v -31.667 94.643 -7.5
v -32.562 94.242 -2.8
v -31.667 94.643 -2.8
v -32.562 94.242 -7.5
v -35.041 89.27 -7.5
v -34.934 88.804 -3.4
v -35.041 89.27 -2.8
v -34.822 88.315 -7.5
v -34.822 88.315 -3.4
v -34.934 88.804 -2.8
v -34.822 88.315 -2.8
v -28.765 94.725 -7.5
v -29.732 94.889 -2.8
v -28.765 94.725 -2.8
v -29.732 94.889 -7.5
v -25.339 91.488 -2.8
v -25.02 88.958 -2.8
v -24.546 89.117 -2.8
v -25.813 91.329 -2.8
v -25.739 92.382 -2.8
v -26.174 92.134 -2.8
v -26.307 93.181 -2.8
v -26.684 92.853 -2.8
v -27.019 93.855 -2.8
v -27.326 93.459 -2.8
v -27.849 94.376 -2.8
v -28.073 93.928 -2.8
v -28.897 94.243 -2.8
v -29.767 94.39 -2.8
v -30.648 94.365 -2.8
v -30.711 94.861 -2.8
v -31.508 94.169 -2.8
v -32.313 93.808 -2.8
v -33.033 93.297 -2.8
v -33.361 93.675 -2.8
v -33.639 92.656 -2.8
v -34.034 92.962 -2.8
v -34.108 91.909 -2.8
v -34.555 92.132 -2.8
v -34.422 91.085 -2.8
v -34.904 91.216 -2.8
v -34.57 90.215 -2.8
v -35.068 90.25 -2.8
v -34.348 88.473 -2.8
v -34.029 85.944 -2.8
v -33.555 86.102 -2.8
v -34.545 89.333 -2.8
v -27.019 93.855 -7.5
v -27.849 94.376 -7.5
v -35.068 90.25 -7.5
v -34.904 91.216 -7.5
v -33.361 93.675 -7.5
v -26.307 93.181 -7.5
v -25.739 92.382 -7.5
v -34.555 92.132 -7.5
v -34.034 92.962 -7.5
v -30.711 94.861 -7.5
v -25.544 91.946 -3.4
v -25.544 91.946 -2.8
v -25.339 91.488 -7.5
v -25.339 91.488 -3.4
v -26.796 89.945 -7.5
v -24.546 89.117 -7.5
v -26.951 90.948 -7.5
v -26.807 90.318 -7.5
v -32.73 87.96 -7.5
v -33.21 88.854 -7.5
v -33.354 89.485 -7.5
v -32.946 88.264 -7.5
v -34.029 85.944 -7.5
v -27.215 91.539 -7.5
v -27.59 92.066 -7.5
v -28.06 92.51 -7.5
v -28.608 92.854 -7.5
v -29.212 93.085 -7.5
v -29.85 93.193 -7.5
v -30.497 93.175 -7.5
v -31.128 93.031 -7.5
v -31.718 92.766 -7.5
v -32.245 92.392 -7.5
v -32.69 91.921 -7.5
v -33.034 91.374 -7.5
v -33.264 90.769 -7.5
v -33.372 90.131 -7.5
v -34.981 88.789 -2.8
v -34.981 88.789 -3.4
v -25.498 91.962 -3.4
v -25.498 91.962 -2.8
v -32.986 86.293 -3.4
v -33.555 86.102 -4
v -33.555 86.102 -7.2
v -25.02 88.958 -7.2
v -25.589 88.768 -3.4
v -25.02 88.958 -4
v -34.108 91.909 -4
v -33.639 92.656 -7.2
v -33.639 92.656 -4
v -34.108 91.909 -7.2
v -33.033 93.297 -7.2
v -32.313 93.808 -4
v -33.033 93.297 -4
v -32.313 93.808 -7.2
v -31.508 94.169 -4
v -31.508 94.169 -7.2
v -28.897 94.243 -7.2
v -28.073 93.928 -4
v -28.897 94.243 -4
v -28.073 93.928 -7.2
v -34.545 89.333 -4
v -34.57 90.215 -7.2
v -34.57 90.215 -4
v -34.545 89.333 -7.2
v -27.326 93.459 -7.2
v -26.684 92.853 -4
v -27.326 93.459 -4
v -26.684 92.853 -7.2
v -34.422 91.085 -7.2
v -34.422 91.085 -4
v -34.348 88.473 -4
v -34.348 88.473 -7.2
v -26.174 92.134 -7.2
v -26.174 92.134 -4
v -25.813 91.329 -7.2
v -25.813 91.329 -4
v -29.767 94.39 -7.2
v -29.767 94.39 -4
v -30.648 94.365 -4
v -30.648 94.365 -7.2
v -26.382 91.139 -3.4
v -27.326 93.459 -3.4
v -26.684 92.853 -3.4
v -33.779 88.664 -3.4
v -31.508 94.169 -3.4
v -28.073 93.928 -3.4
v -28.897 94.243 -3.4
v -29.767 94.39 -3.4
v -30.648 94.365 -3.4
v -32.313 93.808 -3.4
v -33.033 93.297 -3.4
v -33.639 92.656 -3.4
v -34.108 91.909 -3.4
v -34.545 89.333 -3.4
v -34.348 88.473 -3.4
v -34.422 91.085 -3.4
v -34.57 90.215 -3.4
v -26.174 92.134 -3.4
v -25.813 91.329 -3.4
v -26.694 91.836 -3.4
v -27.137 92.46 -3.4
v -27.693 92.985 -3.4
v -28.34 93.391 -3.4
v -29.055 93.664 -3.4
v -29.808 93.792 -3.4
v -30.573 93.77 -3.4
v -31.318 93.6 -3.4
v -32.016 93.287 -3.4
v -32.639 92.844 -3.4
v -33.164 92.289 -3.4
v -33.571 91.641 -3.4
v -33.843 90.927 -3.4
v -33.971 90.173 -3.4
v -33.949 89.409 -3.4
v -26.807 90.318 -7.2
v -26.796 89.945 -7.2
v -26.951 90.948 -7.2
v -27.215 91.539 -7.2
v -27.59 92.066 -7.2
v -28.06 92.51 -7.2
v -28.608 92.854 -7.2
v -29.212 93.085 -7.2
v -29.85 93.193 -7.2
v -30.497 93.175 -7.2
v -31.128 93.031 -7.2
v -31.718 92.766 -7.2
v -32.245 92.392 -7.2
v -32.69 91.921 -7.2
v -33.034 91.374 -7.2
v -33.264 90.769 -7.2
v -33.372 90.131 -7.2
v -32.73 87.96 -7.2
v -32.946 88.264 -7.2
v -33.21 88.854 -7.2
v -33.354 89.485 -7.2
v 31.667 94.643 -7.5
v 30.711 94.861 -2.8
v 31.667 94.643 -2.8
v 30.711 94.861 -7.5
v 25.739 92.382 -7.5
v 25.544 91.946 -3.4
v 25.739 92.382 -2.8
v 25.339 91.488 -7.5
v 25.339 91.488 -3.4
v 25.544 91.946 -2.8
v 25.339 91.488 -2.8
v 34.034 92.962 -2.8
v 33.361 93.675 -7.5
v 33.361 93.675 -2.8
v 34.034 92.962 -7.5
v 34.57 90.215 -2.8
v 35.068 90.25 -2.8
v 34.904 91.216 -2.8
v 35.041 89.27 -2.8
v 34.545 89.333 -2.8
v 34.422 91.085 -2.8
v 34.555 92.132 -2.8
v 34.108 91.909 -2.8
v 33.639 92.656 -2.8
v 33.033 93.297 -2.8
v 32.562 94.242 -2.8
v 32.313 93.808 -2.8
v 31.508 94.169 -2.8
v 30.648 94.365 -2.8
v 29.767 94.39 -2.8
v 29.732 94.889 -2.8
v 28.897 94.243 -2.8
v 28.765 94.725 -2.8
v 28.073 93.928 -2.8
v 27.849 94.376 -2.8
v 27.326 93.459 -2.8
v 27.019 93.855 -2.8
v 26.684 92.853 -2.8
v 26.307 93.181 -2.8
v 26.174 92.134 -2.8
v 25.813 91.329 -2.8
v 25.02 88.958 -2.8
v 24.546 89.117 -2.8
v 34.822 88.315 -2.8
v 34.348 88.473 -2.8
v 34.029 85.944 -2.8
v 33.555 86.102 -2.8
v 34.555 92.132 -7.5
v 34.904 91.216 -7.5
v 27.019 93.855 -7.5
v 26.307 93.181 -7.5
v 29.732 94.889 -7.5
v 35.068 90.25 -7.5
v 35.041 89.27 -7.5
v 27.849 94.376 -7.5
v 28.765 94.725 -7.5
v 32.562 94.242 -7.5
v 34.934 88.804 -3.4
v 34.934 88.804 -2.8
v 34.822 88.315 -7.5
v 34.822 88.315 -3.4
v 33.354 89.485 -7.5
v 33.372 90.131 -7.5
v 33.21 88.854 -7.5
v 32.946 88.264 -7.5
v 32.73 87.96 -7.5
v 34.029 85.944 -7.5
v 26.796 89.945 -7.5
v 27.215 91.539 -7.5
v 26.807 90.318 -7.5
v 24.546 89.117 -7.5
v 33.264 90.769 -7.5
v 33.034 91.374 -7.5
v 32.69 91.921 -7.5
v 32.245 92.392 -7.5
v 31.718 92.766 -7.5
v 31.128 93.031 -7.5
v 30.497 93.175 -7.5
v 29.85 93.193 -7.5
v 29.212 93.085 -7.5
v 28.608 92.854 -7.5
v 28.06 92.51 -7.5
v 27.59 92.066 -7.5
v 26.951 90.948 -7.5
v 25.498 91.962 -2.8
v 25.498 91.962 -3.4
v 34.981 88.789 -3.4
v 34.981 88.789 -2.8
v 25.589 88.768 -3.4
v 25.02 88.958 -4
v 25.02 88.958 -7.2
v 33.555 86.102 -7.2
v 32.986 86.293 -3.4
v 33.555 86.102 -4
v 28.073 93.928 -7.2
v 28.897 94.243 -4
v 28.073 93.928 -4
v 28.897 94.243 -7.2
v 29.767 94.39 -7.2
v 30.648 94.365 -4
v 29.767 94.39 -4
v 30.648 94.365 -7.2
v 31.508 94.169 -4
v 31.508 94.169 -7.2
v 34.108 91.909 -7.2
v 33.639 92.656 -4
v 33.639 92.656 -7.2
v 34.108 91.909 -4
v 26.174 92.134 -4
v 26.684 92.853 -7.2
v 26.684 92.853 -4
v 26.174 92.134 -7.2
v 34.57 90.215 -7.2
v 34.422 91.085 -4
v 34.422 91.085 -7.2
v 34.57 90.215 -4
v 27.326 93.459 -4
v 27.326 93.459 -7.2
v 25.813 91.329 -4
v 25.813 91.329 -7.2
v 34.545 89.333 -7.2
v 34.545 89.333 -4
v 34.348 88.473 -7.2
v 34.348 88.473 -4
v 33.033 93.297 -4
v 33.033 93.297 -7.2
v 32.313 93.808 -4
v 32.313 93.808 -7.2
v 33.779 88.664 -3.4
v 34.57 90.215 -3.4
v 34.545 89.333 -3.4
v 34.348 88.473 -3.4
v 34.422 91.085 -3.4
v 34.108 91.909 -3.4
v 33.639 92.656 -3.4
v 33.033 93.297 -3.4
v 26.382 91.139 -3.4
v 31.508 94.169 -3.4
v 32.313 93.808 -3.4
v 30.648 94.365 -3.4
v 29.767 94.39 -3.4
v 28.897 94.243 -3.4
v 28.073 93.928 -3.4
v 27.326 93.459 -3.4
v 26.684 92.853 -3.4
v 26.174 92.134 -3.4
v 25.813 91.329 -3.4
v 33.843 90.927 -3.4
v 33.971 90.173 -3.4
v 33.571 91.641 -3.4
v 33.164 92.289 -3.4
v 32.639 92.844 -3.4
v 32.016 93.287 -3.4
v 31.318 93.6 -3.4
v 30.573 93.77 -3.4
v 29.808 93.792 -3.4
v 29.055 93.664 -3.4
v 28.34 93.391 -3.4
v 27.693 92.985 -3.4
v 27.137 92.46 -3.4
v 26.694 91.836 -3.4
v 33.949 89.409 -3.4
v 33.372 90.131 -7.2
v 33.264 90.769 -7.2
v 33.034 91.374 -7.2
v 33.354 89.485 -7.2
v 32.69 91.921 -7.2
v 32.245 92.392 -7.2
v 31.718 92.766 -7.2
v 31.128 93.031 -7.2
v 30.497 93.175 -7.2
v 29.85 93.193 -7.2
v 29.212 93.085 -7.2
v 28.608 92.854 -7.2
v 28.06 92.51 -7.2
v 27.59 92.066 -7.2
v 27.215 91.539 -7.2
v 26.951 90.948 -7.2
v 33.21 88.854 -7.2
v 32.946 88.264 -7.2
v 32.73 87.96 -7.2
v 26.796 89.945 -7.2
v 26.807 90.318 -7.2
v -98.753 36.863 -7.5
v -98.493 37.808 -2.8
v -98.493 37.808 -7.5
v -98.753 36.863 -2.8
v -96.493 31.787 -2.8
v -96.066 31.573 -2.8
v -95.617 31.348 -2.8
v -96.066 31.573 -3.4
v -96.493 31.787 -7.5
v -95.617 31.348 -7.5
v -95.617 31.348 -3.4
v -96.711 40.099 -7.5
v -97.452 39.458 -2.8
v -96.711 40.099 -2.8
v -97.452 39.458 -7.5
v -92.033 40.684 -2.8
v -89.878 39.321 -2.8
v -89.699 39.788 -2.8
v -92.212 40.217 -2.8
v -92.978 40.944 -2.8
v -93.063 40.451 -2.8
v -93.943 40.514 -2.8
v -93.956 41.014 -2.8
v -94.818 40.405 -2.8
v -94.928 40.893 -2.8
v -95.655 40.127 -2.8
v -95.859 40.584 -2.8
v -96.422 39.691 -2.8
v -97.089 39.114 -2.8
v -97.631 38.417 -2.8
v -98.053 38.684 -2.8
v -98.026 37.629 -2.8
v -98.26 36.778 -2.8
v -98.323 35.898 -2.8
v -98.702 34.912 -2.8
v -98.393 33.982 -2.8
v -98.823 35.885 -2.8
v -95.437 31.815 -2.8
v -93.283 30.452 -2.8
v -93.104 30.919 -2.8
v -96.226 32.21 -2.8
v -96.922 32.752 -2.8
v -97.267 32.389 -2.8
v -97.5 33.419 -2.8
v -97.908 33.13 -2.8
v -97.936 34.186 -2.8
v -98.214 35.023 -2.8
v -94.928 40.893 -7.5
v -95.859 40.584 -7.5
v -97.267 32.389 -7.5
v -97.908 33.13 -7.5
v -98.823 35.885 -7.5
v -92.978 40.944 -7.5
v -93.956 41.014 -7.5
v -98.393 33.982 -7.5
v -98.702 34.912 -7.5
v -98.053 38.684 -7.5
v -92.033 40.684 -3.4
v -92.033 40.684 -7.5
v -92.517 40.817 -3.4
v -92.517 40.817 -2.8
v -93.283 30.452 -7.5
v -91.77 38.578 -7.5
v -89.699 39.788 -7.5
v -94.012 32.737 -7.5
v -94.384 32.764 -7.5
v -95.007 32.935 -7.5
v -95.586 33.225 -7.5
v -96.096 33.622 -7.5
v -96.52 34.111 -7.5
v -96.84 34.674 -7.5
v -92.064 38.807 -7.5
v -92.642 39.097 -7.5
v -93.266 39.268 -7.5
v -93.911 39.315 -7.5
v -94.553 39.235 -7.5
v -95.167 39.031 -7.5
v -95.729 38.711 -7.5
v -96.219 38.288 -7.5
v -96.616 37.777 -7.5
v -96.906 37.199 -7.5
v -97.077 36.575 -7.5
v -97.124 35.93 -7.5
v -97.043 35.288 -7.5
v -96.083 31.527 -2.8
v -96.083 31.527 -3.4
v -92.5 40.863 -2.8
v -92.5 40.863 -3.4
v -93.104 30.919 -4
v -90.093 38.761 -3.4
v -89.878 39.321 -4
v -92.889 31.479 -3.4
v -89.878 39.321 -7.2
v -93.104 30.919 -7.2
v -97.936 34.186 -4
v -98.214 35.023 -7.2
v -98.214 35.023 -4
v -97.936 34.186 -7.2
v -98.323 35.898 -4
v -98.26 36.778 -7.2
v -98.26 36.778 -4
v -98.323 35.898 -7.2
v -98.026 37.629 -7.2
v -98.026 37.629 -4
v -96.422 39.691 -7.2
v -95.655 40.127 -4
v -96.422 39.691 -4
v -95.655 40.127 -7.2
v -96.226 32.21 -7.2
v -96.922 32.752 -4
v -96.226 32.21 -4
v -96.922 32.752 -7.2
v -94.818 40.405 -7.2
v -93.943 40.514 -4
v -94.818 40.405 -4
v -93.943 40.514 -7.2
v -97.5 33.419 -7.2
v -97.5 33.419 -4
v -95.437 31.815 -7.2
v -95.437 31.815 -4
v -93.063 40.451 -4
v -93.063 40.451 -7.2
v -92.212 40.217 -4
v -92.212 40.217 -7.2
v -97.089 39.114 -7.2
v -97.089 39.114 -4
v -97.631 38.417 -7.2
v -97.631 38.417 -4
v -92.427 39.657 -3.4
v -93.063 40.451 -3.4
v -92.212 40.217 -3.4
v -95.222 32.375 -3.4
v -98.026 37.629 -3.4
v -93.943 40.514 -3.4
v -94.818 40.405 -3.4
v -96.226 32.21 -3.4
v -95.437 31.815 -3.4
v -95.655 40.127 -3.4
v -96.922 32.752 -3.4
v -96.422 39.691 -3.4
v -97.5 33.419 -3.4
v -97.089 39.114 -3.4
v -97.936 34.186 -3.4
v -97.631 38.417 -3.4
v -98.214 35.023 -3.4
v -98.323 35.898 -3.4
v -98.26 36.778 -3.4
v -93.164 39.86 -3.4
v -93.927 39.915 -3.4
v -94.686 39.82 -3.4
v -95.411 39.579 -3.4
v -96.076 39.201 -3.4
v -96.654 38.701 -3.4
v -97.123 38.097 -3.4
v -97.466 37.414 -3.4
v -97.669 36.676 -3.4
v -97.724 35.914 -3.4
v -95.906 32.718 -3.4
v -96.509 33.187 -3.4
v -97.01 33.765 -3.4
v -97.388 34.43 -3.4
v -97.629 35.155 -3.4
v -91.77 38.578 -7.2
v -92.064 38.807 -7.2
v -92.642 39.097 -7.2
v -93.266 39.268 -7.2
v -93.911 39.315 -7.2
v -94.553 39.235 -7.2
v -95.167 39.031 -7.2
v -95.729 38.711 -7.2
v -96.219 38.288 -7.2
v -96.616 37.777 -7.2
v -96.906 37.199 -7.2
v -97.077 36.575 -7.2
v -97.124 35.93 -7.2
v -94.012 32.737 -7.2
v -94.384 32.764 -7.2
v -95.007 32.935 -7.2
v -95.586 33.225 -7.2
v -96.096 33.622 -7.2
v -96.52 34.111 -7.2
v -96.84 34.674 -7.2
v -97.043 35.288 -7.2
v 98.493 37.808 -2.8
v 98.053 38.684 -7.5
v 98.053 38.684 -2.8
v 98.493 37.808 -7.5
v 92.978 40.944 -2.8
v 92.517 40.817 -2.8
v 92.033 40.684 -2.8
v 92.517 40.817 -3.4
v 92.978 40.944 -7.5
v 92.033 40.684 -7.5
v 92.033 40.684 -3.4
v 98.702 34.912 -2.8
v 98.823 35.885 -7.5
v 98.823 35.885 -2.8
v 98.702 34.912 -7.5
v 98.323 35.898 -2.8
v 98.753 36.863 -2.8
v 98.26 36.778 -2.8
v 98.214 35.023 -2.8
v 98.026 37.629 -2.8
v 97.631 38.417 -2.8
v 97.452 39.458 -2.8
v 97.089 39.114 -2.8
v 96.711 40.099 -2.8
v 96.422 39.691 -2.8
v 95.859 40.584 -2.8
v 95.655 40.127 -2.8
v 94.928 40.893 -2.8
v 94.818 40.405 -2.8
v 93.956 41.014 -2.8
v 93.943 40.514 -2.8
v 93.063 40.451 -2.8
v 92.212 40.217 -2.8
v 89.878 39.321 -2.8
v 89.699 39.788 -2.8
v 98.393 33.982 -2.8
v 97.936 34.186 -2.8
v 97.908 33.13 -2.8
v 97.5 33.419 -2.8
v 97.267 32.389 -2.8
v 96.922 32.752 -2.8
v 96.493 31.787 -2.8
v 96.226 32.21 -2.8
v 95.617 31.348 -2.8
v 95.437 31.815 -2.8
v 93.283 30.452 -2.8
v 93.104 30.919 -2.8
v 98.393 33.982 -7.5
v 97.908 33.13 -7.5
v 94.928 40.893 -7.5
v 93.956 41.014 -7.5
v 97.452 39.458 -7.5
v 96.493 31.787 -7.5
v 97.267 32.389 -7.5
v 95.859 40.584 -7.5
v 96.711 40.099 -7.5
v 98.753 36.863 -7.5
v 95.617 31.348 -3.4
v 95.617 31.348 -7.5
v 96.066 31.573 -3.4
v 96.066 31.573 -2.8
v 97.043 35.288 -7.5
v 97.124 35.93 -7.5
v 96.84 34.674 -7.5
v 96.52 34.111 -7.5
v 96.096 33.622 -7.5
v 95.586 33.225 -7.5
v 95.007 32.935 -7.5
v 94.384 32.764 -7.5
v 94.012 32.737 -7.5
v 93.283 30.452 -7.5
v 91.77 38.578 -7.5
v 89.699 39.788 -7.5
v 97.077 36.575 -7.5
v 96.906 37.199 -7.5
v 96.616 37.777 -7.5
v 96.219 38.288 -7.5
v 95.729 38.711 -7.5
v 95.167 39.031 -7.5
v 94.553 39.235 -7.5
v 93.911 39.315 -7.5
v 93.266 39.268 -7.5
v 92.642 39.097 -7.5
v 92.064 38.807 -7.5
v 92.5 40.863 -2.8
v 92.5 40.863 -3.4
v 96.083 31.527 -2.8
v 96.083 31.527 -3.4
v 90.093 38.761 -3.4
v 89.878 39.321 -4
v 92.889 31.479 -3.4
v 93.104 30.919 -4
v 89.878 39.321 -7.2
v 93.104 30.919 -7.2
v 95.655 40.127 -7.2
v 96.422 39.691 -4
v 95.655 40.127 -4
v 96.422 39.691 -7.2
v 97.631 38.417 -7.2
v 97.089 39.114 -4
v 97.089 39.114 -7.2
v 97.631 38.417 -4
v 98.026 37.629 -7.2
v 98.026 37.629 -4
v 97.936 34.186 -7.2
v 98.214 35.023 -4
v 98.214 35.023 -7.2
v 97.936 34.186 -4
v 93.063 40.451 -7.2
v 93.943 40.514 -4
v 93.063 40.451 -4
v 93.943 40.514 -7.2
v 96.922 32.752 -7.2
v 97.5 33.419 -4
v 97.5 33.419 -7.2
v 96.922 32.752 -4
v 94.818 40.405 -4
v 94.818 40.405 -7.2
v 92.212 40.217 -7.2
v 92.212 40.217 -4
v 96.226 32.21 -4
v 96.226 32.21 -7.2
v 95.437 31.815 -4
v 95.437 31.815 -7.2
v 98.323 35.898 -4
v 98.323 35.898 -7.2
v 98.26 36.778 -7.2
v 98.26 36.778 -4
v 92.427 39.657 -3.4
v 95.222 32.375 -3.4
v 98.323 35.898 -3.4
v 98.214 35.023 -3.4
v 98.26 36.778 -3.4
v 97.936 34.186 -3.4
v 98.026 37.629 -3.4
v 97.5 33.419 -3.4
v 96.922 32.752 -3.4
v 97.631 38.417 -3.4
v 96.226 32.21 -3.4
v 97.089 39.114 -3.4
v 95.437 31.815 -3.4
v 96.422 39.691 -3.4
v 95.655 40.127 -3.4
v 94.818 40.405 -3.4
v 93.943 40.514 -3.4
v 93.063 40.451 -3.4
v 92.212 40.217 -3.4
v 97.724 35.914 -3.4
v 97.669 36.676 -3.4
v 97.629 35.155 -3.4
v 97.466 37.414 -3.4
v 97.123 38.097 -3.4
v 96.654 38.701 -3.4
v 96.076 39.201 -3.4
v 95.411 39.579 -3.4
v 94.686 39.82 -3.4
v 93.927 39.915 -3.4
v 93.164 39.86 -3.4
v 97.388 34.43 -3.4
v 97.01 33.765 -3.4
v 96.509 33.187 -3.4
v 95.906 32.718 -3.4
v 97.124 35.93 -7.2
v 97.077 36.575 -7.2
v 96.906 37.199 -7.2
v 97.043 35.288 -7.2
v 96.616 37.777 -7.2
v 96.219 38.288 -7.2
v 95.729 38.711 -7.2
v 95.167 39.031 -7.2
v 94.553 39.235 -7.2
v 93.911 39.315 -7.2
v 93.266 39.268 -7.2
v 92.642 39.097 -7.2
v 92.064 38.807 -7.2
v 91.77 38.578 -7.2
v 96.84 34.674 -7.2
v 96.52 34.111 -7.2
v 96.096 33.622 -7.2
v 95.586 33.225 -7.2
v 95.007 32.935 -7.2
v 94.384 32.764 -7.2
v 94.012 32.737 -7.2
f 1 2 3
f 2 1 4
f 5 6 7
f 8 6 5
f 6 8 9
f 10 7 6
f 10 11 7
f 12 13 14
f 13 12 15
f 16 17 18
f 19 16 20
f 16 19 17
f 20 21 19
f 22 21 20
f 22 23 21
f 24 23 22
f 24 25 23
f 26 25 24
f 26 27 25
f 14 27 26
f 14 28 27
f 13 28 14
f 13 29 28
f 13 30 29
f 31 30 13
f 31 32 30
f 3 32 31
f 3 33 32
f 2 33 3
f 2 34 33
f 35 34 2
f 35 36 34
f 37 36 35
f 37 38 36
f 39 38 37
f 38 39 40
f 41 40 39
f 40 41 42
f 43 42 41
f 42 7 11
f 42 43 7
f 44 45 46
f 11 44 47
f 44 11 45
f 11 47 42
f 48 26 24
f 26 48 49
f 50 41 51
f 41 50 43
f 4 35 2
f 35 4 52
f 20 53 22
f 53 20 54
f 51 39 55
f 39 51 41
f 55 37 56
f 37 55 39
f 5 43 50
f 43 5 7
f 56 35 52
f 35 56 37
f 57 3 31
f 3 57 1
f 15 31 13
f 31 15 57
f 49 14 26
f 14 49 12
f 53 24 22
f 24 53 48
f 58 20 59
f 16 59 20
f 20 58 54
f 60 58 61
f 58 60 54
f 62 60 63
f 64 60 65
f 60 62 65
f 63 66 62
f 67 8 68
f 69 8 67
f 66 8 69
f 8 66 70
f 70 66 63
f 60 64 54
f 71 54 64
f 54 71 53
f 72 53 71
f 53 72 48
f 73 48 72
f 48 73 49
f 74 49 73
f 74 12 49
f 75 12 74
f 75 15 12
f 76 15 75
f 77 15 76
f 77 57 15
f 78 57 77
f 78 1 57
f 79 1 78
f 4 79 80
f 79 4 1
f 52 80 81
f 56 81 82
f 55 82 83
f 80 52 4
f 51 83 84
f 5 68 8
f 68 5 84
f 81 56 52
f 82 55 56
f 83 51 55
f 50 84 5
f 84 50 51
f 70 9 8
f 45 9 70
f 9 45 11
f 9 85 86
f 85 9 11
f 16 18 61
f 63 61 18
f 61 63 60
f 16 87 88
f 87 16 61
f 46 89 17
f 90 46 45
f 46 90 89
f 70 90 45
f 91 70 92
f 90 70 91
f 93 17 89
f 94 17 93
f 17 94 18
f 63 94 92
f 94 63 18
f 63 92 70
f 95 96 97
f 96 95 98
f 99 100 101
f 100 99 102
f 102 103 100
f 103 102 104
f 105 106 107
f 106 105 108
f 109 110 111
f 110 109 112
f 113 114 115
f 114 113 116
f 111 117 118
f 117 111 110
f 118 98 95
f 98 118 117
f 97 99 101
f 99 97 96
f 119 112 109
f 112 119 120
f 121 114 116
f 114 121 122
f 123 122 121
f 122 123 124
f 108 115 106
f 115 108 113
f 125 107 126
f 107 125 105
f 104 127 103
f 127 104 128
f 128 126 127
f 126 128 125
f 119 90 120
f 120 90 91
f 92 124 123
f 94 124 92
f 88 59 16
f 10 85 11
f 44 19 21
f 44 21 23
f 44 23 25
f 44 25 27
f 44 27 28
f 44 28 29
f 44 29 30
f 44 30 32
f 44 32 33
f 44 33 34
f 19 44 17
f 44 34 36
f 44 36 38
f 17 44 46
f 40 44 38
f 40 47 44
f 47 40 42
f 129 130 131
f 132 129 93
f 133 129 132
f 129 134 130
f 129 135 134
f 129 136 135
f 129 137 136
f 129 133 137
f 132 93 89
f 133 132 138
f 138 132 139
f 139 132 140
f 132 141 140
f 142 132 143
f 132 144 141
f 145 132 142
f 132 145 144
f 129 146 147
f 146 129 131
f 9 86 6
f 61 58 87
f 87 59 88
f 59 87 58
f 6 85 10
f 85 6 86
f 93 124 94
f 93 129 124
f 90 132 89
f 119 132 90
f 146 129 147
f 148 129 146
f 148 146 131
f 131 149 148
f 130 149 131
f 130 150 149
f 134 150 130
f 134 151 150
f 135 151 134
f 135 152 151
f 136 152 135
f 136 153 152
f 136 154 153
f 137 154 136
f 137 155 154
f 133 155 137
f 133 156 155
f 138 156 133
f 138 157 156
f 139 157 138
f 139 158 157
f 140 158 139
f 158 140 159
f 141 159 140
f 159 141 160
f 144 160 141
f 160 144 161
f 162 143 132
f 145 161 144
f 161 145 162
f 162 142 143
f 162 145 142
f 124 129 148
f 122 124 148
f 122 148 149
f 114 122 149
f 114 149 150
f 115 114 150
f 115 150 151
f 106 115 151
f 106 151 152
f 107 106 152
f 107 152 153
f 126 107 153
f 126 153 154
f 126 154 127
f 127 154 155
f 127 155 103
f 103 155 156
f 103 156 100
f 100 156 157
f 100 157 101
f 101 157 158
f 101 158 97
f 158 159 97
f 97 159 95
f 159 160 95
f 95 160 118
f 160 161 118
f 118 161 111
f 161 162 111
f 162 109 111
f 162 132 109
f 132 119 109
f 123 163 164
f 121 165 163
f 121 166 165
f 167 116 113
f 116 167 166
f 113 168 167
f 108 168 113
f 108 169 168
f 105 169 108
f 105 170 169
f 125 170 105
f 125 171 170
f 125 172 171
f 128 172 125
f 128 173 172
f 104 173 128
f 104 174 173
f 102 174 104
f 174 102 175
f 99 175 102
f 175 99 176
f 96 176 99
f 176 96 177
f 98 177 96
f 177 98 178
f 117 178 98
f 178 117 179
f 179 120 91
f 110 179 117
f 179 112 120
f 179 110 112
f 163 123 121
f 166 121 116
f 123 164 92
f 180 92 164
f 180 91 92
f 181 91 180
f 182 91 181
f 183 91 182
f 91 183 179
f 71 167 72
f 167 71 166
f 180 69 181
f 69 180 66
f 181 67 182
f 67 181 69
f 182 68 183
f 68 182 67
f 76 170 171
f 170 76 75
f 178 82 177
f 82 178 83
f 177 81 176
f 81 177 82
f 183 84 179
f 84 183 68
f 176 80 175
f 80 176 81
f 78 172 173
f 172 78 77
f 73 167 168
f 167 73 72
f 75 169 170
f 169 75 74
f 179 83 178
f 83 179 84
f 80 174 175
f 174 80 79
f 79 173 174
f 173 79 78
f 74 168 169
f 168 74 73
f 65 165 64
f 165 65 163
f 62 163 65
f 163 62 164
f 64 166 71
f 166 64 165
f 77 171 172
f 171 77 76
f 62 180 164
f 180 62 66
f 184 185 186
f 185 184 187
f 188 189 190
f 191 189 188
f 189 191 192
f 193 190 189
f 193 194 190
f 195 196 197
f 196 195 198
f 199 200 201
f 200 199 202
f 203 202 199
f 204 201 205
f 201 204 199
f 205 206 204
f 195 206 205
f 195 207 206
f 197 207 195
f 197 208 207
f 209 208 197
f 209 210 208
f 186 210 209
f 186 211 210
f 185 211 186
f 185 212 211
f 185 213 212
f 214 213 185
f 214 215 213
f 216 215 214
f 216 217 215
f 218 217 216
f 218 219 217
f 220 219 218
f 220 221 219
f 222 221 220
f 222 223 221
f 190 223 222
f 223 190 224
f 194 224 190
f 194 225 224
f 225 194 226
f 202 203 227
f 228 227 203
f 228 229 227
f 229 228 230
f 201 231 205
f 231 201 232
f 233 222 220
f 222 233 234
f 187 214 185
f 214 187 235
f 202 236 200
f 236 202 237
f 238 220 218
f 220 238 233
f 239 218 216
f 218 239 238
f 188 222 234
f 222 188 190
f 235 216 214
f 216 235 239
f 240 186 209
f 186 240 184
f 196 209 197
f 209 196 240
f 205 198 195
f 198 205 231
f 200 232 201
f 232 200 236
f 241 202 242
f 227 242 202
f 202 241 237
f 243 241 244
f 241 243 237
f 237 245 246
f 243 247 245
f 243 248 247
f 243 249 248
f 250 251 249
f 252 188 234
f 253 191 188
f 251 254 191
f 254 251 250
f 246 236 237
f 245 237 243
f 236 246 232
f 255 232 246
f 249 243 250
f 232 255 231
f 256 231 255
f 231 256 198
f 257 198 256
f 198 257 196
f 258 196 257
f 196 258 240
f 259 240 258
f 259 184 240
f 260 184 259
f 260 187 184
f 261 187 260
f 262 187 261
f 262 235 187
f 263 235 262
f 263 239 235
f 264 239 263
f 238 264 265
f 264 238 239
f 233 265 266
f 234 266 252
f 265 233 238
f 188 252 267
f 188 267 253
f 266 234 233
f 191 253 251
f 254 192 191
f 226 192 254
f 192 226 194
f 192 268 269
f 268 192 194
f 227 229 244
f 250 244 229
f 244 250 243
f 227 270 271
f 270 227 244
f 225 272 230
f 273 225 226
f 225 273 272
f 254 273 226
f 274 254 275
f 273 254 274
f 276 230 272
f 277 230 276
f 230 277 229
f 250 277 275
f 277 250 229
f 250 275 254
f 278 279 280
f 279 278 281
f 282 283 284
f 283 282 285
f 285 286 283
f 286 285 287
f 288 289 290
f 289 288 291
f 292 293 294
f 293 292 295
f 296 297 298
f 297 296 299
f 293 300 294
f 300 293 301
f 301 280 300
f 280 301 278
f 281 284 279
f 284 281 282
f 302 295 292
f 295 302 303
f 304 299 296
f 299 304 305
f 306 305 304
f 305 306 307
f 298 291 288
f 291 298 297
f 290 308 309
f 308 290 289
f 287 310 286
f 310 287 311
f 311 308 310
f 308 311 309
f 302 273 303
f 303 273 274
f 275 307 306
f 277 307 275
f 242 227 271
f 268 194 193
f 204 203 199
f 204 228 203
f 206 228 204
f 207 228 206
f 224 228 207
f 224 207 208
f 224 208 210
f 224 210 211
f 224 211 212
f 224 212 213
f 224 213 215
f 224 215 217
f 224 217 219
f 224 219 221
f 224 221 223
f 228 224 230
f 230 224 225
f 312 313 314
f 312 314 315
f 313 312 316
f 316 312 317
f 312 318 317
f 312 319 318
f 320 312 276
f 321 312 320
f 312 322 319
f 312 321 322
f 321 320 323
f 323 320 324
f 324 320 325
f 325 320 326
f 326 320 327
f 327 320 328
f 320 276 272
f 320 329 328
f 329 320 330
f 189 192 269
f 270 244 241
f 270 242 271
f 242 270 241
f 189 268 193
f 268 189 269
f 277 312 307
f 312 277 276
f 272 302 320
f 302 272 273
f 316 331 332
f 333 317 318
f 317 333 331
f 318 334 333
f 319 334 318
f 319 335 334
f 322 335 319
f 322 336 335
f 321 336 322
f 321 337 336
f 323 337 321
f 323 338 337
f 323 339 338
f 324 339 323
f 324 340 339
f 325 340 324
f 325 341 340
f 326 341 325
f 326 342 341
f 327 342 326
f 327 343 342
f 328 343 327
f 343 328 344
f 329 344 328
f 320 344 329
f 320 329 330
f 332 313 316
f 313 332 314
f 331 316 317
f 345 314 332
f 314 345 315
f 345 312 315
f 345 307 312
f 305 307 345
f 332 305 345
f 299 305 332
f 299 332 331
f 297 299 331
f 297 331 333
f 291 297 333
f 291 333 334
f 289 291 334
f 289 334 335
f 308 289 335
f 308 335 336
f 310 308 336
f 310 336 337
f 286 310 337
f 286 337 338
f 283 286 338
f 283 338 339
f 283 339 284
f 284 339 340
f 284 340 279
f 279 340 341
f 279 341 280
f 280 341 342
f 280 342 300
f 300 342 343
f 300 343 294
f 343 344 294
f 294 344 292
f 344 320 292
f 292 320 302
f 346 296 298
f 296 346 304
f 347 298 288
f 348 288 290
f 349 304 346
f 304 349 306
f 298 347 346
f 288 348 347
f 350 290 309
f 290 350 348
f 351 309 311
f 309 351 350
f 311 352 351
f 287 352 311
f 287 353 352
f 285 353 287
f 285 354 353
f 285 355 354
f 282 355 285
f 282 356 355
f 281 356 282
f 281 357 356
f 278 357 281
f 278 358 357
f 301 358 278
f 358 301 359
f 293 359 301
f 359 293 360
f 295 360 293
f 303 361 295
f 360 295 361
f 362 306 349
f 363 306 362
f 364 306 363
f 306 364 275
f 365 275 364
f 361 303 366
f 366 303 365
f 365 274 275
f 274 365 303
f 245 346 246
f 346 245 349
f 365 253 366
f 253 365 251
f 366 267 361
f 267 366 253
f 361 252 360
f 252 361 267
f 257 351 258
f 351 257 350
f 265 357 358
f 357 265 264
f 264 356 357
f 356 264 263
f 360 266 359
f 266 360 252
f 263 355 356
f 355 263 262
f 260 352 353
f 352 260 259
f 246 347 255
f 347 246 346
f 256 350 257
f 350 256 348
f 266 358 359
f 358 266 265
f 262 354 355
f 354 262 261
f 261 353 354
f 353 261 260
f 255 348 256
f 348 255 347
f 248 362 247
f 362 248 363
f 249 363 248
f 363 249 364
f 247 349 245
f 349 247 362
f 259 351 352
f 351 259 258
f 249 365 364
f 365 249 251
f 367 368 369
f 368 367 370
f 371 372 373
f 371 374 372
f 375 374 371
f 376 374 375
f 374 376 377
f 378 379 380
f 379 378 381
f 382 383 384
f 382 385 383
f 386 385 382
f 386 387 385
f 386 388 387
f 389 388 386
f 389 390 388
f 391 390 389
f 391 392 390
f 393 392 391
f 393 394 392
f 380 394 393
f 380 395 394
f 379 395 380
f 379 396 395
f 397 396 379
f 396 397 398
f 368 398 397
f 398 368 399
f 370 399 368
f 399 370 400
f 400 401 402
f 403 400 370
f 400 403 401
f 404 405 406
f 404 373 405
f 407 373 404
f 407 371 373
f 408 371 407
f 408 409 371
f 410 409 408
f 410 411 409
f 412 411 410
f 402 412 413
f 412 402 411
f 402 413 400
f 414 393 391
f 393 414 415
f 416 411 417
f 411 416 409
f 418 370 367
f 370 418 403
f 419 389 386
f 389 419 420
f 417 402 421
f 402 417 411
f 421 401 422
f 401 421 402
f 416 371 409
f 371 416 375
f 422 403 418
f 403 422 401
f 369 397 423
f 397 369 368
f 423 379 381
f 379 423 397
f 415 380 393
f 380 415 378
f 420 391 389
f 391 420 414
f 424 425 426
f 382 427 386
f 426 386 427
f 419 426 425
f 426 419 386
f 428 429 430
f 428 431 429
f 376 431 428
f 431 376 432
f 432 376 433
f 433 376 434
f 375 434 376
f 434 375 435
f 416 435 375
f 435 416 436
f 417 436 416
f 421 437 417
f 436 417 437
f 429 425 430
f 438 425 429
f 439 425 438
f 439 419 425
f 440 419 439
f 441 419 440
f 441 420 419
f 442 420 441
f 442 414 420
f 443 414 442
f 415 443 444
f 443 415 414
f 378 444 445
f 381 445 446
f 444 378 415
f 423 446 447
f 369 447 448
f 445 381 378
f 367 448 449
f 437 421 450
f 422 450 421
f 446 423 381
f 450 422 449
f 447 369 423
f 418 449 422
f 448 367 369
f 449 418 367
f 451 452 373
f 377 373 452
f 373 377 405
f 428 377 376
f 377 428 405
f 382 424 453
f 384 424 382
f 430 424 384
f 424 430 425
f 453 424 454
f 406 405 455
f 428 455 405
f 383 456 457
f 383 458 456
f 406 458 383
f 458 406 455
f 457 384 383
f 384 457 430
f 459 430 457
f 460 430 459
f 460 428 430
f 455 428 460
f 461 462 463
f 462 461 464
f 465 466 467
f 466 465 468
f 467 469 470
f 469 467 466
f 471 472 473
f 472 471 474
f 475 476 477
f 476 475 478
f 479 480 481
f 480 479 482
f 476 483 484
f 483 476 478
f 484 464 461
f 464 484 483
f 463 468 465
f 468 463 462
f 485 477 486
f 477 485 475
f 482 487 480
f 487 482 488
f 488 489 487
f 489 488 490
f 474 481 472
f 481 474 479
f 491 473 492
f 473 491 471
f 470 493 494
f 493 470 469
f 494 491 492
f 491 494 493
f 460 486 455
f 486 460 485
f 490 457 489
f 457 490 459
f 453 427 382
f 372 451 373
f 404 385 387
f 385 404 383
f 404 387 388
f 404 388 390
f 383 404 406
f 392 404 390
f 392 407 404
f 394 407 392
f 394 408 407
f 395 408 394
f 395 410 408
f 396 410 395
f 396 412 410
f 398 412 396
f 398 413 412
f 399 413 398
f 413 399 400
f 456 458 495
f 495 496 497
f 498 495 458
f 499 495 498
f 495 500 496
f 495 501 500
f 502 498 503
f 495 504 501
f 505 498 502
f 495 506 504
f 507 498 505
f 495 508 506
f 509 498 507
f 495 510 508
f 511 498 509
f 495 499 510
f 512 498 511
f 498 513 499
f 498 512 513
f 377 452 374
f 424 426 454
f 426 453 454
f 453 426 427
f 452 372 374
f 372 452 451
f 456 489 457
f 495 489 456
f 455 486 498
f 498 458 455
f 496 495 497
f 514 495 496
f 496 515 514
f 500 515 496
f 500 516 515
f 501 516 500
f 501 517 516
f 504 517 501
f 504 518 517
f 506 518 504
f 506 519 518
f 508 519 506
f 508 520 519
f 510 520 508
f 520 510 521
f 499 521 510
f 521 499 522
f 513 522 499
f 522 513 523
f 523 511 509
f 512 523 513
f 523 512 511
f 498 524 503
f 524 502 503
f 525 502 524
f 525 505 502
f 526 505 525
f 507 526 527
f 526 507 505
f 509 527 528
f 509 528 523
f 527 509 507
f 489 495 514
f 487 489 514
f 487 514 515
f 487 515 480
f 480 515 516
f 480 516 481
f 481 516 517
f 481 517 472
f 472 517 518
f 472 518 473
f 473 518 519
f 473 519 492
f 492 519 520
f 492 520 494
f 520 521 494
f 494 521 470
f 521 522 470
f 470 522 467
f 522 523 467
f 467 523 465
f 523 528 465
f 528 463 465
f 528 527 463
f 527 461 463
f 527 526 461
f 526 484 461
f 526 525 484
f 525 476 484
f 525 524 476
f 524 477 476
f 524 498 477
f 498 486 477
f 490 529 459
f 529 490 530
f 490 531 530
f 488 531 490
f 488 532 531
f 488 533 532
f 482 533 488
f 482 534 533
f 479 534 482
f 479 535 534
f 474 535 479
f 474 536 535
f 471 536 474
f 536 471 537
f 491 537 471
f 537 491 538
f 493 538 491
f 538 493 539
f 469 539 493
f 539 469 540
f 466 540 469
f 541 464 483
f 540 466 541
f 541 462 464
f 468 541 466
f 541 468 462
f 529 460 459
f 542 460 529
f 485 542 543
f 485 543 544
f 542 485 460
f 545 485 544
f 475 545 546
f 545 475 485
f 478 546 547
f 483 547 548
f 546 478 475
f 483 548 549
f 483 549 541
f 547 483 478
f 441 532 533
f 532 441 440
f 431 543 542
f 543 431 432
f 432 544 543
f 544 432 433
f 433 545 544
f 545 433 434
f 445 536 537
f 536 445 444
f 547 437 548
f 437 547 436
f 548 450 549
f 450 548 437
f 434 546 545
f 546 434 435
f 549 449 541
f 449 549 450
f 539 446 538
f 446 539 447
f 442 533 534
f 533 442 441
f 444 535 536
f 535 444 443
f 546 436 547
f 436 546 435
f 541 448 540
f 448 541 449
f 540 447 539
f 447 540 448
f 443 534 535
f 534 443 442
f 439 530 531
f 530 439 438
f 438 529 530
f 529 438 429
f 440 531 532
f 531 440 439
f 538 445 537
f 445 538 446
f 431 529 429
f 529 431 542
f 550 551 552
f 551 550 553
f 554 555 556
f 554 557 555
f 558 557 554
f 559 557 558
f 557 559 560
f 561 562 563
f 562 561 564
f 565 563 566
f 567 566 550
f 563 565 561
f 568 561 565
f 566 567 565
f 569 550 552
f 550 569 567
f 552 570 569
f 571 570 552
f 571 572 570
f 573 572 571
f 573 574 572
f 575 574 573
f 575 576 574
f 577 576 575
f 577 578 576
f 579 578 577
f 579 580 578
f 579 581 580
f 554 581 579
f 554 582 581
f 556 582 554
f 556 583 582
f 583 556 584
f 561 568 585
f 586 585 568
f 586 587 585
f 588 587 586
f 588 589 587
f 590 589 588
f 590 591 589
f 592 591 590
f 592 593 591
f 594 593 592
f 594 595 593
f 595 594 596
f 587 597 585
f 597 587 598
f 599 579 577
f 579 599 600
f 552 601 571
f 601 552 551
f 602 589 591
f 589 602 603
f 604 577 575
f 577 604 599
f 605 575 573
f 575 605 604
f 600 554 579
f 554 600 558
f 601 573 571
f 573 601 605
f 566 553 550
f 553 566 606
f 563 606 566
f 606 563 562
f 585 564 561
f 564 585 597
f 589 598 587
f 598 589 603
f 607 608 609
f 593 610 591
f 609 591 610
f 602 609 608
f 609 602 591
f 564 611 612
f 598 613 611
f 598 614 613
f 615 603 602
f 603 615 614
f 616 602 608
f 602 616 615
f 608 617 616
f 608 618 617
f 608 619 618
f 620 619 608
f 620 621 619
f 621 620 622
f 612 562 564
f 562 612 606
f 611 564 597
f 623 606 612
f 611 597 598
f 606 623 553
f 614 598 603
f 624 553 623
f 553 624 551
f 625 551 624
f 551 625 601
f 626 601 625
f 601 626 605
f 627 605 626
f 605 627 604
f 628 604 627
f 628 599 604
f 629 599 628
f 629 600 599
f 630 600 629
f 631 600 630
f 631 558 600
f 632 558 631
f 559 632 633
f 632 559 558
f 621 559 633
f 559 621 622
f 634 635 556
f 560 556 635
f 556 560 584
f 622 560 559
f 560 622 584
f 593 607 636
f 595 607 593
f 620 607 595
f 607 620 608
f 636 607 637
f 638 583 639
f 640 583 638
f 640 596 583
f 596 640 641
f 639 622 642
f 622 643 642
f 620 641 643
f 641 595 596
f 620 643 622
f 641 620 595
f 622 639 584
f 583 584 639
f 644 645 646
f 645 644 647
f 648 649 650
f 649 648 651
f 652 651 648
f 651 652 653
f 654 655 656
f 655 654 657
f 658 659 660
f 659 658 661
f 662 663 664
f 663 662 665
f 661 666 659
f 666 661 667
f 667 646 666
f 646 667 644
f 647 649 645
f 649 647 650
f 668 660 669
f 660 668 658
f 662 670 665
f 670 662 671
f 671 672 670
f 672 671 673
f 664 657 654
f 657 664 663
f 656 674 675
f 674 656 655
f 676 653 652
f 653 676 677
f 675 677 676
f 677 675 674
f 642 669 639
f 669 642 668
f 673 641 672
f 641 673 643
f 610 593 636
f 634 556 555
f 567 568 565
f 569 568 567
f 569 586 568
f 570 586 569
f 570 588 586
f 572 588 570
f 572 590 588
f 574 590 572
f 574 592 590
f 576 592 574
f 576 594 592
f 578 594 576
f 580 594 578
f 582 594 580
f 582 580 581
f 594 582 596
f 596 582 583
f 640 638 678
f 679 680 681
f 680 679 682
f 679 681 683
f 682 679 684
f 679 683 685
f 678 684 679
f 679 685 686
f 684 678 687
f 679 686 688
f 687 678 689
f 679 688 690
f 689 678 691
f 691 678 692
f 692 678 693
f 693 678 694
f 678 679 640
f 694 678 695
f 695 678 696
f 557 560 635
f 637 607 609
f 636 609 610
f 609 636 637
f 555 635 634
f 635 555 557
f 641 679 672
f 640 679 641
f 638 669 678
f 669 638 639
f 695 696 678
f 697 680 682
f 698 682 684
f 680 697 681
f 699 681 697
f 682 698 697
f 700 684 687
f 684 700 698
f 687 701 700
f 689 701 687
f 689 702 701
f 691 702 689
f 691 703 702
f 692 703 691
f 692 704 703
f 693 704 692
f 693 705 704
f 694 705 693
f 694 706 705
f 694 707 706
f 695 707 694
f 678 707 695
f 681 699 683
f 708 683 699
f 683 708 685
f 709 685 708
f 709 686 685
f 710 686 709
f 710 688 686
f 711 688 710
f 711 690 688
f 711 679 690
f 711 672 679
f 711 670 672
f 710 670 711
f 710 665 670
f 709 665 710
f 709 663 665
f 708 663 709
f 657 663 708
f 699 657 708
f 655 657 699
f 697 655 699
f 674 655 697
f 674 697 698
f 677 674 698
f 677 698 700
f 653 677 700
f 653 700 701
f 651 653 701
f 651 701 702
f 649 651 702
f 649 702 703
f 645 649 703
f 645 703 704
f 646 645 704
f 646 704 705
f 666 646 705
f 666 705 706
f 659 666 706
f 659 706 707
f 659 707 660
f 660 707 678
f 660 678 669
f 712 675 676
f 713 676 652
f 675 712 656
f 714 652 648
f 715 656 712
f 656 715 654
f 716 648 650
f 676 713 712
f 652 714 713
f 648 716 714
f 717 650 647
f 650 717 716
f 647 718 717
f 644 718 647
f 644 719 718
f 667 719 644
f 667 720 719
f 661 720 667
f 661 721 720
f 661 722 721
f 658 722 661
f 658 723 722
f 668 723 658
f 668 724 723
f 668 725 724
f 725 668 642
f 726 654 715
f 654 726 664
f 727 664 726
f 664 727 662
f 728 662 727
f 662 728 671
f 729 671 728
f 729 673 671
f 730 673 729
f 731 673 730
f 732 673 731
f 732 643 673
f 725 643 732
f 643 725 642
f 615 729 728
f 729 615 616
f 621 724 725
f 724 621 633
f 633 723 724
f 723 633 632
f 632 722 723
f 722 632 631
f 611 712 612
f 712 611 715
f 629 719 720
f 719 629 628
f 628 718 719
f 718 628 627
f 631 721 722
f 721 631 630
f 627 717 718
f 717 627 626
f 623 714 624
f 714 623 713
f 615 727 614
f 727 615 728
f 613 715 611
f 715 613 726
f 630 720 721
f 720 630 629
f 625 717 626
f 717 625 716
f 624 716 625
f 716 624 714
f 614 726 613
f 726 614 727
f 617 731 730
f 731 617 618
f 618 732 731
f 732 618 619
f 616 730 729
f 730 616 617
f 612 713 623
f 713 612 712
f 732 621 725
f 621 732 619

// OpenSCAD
// -*- mode: scad; c-basic-offset: 2; indent-tabs-mode:nil -*-
// Incoroprating some feedback from local healthcare providers
//   * weight-reducing of front-part if possible.
//   * Move the shield buttons up so that there is material behind the openings
//     of the shield-punches

$fn=32;
e=0.01;

// Running version number. Should align with v1.x release.
// Intermediate git release WIP add a '
version_number="5";

support_column_foot_thickness=1.2;  // support-column: this much extra wide foot
support_wall=0.5; // Use 0.5 if slicer can detect thin walls.
support_column_radius=5.0;

pin_diameter=5;  // mm
print_layer_height=0.3;   // Layer thickness we're printing

// Experimental stacking.
default_stack_height = 3;
stack_separation=print_layer_height;

// Size of the band depending on if we request it to be 'thin'
function get_band_thick(is_thin) = is_thin ? 15 : 20;

module maker_nexus_baseline_headband(version_text, is_thin=false) {
  file = str("baseline/RC2-nexusized-", (is_thin ? "thin":"normal"), ".stl");
  offset = -get_band_thick(is_thin) / 2;
  text_depth=0.2;
  difference() {
    translate([0, 20, offset]) import(file, convexity=10);

    // Prusa Attribution
    translate([-87.2 + text_depth, -14, -5]) rotate([90, 0, -90])
      translate([0, 1, 0]) linear_extrude(height=2) text("Prusa", size=9, halign="center", font="style:Bold");

    // Maker Nexus Attribution
    translate([87.26 - text_depth, -30, 0]) {
      translate([0, 4, 1]) rotate([90, 0, 90]) linear_extrude(height=1)
        text("Maker", size=5, halign="left", font="style:Bold");
      translate([0, 4, -5]) rotate([90, 0, 90]) linear_extrude(height=1)
        text("Nexus", size=5, halign="left", font="style:Bold");
    }

    // Keep track of MakerNexus Version number
    translate([84.75 + text_depth, -48, -4]) rotate([90, 0, -90]) linear_extrude(height=1)
      text(str(version_text, version_number),
           size=8, halign="right", font="style:Bold");
  }
}

// Support for the pins.
module support_column(angle=0, dist=0, wall_thick=support_wall,
                      is_first=true, is_last=true, is_thin=false) {
  r=support_column_radius;
  // distances were originally calibrated for r=5mm
  dist=dist-(5-support_column_radius);
  band_thick = get_band_thick(is_thin);
  level_thick=2*print_layer_height;
  support_platform = (get_band_thick(is_thin) - pin_diameter)/2 - print_layer_height;
  h=is_last ? support_platform : band_thick + stack_separation;

  color("yellow") rotate([0, 0, angle]) translate([0, dist, -band_thick/2])
    rotate([0, 0, 180]) {
    intersection() {
      translate([-r, -r-2.5, 0]) cube([2*r, 2*r, h]);
      union() {
        difference() {
          union() {
            cylinder(r=r, h=h);  // Column
            translate([-r, 0, 0]) cube([2*r, 0.5*r, h]); // .. flattened
          }
          translate([0, 0, -e]) union() {  // Remove inside
            translate([0, 0, 0]) cylinder(r=r-wall_thick, h=h+2*e);
            translate([-(r-wall_thick), 0, 0]) cube([2*(r-wall_thick), r, h+2*e]);
          }
        }

        // The 'shelf' part.
        translate([0, -0.5, support_platform-level_thick]) {
          translate([-r, 0, 0]) cube([2*r, 3, level_thick]);
          cylinder(r=r-wall_thick, h=level_thick);
        }

        // shelf supports
        support_edge_length = 2 * print_layer_height;
        translate([0, 0, support_platform-level_thick]) rotate([-90, 0, 0]) {
          translate([-(r-wall_thick), 0, 0])  {
            linear_extrude(height=r) polygon([[0, 0], [support_edge_length, 0], [0, support_edge_length]]);
          }
          translate([r-wall_thick, 0, 0]) {
            linear_extrude(height=r) polygon([[0, 0], [-support_edge_length, 0], [0, support_edge_length]]);
          }
          rotate([90, 0, 0]) translate([0, 0, -support_edge_length]){
            rotate_extrude(angle=180) translate([-(r-wall_thick), 0, 0]) polygon([[0, 0], [support_edge_length, support_edge_length], [0, support_edge_length]]);
          }
        }
      }
    }

    // Some stability foot if we're first. Don't make it entirely solid, as
    // that seems to be too well connected to the build-bed.
    if (is_first) intersection() {
      translate([-15/2, -7.5, 0]) cube([15, 10, 1]);
      union() {
        difference() {
          cylinder(r=r, h=.3);
          translate([0, 0, -e]) cylinder(r=r-support_column_foot_thickness-wall_thick, h=0.3+2*e);
        }
        translate([-r, 1, 0]) cube([2*r, 1.5, 0.3]);
      }
    }
  }
}

// The angle and distance the pins. We only need some rough position,
// as we just use this as a cut-out where we do the material-move operation.
// There we just move the bottom part up and replace the bottom part with
// what we found above (angles, positions determined empirically)
pin_angle_distances = [ [18.5, 94.8], [-18.5, 94.8], [69, 100.5], [-69, 100.5]];

module print_shield(version_text, do_punches=true, pin_support=false,
                    is_thin=false, is_first=true, is_last=true) {
  //maker_nexus_baseline_headband(version_text, is_thin);
  // Add support for the pins.
  if (pin_support) {
    for (x = pin_angle_distances) support_column(x[0], x[1],
                                                 is_thin=is_thin,
                                                 is_last=is_last,
                                                 is_first=is_first);
  }
}

// Print a stack of face-shields.
module print_stack(count=default_stack_height, is_thin=false) {
  stack_distance = get_band_thick(is_thin) + stack_separation;
  base_version = str("s", is_thin ? "" : "n");
  for (i = [0:1:count-e]) {
    translate([0, 0, i*stack_distance]) {
      is_first = (i == 0);
      is_last = (i == (count - 1));
      print_shield(base_version, pin_support=true,
                   is_first=is_first, is_last=is_last,
                   is_thin=is_thin, do_punches=!is_thin);
    }
  }
}


/* Some functions which we use to generate named
 * STLs directly in the Makefile
 */
module normal_shield_no_support() {
  print_shield("N", do_punches=false, pin_support=false);
}
module normal_shield_with_support() {
  print_shield("N", do_punches=false, pin_support=true);
}
module thin_shield_no_support() {
  print_shield("T", do_punches=false, pin_support=false, is_thin=true);
}
module thin_shield_with_support() {
  print_shield("T", do_punches=false, pin_support=true, is_thin=true);
}

module normal_stack_with_support() {
  print_stack(default_stack_height, is_thin=false);
}
module thin_stack_with_support() {
  print_stack(default_stack_height, is_thin=true);
}

// Local testing call. Can be left in, it will be ignored in the Makefile.
thin_shield_with_support();
//print_stack(3, is_thin=true);
